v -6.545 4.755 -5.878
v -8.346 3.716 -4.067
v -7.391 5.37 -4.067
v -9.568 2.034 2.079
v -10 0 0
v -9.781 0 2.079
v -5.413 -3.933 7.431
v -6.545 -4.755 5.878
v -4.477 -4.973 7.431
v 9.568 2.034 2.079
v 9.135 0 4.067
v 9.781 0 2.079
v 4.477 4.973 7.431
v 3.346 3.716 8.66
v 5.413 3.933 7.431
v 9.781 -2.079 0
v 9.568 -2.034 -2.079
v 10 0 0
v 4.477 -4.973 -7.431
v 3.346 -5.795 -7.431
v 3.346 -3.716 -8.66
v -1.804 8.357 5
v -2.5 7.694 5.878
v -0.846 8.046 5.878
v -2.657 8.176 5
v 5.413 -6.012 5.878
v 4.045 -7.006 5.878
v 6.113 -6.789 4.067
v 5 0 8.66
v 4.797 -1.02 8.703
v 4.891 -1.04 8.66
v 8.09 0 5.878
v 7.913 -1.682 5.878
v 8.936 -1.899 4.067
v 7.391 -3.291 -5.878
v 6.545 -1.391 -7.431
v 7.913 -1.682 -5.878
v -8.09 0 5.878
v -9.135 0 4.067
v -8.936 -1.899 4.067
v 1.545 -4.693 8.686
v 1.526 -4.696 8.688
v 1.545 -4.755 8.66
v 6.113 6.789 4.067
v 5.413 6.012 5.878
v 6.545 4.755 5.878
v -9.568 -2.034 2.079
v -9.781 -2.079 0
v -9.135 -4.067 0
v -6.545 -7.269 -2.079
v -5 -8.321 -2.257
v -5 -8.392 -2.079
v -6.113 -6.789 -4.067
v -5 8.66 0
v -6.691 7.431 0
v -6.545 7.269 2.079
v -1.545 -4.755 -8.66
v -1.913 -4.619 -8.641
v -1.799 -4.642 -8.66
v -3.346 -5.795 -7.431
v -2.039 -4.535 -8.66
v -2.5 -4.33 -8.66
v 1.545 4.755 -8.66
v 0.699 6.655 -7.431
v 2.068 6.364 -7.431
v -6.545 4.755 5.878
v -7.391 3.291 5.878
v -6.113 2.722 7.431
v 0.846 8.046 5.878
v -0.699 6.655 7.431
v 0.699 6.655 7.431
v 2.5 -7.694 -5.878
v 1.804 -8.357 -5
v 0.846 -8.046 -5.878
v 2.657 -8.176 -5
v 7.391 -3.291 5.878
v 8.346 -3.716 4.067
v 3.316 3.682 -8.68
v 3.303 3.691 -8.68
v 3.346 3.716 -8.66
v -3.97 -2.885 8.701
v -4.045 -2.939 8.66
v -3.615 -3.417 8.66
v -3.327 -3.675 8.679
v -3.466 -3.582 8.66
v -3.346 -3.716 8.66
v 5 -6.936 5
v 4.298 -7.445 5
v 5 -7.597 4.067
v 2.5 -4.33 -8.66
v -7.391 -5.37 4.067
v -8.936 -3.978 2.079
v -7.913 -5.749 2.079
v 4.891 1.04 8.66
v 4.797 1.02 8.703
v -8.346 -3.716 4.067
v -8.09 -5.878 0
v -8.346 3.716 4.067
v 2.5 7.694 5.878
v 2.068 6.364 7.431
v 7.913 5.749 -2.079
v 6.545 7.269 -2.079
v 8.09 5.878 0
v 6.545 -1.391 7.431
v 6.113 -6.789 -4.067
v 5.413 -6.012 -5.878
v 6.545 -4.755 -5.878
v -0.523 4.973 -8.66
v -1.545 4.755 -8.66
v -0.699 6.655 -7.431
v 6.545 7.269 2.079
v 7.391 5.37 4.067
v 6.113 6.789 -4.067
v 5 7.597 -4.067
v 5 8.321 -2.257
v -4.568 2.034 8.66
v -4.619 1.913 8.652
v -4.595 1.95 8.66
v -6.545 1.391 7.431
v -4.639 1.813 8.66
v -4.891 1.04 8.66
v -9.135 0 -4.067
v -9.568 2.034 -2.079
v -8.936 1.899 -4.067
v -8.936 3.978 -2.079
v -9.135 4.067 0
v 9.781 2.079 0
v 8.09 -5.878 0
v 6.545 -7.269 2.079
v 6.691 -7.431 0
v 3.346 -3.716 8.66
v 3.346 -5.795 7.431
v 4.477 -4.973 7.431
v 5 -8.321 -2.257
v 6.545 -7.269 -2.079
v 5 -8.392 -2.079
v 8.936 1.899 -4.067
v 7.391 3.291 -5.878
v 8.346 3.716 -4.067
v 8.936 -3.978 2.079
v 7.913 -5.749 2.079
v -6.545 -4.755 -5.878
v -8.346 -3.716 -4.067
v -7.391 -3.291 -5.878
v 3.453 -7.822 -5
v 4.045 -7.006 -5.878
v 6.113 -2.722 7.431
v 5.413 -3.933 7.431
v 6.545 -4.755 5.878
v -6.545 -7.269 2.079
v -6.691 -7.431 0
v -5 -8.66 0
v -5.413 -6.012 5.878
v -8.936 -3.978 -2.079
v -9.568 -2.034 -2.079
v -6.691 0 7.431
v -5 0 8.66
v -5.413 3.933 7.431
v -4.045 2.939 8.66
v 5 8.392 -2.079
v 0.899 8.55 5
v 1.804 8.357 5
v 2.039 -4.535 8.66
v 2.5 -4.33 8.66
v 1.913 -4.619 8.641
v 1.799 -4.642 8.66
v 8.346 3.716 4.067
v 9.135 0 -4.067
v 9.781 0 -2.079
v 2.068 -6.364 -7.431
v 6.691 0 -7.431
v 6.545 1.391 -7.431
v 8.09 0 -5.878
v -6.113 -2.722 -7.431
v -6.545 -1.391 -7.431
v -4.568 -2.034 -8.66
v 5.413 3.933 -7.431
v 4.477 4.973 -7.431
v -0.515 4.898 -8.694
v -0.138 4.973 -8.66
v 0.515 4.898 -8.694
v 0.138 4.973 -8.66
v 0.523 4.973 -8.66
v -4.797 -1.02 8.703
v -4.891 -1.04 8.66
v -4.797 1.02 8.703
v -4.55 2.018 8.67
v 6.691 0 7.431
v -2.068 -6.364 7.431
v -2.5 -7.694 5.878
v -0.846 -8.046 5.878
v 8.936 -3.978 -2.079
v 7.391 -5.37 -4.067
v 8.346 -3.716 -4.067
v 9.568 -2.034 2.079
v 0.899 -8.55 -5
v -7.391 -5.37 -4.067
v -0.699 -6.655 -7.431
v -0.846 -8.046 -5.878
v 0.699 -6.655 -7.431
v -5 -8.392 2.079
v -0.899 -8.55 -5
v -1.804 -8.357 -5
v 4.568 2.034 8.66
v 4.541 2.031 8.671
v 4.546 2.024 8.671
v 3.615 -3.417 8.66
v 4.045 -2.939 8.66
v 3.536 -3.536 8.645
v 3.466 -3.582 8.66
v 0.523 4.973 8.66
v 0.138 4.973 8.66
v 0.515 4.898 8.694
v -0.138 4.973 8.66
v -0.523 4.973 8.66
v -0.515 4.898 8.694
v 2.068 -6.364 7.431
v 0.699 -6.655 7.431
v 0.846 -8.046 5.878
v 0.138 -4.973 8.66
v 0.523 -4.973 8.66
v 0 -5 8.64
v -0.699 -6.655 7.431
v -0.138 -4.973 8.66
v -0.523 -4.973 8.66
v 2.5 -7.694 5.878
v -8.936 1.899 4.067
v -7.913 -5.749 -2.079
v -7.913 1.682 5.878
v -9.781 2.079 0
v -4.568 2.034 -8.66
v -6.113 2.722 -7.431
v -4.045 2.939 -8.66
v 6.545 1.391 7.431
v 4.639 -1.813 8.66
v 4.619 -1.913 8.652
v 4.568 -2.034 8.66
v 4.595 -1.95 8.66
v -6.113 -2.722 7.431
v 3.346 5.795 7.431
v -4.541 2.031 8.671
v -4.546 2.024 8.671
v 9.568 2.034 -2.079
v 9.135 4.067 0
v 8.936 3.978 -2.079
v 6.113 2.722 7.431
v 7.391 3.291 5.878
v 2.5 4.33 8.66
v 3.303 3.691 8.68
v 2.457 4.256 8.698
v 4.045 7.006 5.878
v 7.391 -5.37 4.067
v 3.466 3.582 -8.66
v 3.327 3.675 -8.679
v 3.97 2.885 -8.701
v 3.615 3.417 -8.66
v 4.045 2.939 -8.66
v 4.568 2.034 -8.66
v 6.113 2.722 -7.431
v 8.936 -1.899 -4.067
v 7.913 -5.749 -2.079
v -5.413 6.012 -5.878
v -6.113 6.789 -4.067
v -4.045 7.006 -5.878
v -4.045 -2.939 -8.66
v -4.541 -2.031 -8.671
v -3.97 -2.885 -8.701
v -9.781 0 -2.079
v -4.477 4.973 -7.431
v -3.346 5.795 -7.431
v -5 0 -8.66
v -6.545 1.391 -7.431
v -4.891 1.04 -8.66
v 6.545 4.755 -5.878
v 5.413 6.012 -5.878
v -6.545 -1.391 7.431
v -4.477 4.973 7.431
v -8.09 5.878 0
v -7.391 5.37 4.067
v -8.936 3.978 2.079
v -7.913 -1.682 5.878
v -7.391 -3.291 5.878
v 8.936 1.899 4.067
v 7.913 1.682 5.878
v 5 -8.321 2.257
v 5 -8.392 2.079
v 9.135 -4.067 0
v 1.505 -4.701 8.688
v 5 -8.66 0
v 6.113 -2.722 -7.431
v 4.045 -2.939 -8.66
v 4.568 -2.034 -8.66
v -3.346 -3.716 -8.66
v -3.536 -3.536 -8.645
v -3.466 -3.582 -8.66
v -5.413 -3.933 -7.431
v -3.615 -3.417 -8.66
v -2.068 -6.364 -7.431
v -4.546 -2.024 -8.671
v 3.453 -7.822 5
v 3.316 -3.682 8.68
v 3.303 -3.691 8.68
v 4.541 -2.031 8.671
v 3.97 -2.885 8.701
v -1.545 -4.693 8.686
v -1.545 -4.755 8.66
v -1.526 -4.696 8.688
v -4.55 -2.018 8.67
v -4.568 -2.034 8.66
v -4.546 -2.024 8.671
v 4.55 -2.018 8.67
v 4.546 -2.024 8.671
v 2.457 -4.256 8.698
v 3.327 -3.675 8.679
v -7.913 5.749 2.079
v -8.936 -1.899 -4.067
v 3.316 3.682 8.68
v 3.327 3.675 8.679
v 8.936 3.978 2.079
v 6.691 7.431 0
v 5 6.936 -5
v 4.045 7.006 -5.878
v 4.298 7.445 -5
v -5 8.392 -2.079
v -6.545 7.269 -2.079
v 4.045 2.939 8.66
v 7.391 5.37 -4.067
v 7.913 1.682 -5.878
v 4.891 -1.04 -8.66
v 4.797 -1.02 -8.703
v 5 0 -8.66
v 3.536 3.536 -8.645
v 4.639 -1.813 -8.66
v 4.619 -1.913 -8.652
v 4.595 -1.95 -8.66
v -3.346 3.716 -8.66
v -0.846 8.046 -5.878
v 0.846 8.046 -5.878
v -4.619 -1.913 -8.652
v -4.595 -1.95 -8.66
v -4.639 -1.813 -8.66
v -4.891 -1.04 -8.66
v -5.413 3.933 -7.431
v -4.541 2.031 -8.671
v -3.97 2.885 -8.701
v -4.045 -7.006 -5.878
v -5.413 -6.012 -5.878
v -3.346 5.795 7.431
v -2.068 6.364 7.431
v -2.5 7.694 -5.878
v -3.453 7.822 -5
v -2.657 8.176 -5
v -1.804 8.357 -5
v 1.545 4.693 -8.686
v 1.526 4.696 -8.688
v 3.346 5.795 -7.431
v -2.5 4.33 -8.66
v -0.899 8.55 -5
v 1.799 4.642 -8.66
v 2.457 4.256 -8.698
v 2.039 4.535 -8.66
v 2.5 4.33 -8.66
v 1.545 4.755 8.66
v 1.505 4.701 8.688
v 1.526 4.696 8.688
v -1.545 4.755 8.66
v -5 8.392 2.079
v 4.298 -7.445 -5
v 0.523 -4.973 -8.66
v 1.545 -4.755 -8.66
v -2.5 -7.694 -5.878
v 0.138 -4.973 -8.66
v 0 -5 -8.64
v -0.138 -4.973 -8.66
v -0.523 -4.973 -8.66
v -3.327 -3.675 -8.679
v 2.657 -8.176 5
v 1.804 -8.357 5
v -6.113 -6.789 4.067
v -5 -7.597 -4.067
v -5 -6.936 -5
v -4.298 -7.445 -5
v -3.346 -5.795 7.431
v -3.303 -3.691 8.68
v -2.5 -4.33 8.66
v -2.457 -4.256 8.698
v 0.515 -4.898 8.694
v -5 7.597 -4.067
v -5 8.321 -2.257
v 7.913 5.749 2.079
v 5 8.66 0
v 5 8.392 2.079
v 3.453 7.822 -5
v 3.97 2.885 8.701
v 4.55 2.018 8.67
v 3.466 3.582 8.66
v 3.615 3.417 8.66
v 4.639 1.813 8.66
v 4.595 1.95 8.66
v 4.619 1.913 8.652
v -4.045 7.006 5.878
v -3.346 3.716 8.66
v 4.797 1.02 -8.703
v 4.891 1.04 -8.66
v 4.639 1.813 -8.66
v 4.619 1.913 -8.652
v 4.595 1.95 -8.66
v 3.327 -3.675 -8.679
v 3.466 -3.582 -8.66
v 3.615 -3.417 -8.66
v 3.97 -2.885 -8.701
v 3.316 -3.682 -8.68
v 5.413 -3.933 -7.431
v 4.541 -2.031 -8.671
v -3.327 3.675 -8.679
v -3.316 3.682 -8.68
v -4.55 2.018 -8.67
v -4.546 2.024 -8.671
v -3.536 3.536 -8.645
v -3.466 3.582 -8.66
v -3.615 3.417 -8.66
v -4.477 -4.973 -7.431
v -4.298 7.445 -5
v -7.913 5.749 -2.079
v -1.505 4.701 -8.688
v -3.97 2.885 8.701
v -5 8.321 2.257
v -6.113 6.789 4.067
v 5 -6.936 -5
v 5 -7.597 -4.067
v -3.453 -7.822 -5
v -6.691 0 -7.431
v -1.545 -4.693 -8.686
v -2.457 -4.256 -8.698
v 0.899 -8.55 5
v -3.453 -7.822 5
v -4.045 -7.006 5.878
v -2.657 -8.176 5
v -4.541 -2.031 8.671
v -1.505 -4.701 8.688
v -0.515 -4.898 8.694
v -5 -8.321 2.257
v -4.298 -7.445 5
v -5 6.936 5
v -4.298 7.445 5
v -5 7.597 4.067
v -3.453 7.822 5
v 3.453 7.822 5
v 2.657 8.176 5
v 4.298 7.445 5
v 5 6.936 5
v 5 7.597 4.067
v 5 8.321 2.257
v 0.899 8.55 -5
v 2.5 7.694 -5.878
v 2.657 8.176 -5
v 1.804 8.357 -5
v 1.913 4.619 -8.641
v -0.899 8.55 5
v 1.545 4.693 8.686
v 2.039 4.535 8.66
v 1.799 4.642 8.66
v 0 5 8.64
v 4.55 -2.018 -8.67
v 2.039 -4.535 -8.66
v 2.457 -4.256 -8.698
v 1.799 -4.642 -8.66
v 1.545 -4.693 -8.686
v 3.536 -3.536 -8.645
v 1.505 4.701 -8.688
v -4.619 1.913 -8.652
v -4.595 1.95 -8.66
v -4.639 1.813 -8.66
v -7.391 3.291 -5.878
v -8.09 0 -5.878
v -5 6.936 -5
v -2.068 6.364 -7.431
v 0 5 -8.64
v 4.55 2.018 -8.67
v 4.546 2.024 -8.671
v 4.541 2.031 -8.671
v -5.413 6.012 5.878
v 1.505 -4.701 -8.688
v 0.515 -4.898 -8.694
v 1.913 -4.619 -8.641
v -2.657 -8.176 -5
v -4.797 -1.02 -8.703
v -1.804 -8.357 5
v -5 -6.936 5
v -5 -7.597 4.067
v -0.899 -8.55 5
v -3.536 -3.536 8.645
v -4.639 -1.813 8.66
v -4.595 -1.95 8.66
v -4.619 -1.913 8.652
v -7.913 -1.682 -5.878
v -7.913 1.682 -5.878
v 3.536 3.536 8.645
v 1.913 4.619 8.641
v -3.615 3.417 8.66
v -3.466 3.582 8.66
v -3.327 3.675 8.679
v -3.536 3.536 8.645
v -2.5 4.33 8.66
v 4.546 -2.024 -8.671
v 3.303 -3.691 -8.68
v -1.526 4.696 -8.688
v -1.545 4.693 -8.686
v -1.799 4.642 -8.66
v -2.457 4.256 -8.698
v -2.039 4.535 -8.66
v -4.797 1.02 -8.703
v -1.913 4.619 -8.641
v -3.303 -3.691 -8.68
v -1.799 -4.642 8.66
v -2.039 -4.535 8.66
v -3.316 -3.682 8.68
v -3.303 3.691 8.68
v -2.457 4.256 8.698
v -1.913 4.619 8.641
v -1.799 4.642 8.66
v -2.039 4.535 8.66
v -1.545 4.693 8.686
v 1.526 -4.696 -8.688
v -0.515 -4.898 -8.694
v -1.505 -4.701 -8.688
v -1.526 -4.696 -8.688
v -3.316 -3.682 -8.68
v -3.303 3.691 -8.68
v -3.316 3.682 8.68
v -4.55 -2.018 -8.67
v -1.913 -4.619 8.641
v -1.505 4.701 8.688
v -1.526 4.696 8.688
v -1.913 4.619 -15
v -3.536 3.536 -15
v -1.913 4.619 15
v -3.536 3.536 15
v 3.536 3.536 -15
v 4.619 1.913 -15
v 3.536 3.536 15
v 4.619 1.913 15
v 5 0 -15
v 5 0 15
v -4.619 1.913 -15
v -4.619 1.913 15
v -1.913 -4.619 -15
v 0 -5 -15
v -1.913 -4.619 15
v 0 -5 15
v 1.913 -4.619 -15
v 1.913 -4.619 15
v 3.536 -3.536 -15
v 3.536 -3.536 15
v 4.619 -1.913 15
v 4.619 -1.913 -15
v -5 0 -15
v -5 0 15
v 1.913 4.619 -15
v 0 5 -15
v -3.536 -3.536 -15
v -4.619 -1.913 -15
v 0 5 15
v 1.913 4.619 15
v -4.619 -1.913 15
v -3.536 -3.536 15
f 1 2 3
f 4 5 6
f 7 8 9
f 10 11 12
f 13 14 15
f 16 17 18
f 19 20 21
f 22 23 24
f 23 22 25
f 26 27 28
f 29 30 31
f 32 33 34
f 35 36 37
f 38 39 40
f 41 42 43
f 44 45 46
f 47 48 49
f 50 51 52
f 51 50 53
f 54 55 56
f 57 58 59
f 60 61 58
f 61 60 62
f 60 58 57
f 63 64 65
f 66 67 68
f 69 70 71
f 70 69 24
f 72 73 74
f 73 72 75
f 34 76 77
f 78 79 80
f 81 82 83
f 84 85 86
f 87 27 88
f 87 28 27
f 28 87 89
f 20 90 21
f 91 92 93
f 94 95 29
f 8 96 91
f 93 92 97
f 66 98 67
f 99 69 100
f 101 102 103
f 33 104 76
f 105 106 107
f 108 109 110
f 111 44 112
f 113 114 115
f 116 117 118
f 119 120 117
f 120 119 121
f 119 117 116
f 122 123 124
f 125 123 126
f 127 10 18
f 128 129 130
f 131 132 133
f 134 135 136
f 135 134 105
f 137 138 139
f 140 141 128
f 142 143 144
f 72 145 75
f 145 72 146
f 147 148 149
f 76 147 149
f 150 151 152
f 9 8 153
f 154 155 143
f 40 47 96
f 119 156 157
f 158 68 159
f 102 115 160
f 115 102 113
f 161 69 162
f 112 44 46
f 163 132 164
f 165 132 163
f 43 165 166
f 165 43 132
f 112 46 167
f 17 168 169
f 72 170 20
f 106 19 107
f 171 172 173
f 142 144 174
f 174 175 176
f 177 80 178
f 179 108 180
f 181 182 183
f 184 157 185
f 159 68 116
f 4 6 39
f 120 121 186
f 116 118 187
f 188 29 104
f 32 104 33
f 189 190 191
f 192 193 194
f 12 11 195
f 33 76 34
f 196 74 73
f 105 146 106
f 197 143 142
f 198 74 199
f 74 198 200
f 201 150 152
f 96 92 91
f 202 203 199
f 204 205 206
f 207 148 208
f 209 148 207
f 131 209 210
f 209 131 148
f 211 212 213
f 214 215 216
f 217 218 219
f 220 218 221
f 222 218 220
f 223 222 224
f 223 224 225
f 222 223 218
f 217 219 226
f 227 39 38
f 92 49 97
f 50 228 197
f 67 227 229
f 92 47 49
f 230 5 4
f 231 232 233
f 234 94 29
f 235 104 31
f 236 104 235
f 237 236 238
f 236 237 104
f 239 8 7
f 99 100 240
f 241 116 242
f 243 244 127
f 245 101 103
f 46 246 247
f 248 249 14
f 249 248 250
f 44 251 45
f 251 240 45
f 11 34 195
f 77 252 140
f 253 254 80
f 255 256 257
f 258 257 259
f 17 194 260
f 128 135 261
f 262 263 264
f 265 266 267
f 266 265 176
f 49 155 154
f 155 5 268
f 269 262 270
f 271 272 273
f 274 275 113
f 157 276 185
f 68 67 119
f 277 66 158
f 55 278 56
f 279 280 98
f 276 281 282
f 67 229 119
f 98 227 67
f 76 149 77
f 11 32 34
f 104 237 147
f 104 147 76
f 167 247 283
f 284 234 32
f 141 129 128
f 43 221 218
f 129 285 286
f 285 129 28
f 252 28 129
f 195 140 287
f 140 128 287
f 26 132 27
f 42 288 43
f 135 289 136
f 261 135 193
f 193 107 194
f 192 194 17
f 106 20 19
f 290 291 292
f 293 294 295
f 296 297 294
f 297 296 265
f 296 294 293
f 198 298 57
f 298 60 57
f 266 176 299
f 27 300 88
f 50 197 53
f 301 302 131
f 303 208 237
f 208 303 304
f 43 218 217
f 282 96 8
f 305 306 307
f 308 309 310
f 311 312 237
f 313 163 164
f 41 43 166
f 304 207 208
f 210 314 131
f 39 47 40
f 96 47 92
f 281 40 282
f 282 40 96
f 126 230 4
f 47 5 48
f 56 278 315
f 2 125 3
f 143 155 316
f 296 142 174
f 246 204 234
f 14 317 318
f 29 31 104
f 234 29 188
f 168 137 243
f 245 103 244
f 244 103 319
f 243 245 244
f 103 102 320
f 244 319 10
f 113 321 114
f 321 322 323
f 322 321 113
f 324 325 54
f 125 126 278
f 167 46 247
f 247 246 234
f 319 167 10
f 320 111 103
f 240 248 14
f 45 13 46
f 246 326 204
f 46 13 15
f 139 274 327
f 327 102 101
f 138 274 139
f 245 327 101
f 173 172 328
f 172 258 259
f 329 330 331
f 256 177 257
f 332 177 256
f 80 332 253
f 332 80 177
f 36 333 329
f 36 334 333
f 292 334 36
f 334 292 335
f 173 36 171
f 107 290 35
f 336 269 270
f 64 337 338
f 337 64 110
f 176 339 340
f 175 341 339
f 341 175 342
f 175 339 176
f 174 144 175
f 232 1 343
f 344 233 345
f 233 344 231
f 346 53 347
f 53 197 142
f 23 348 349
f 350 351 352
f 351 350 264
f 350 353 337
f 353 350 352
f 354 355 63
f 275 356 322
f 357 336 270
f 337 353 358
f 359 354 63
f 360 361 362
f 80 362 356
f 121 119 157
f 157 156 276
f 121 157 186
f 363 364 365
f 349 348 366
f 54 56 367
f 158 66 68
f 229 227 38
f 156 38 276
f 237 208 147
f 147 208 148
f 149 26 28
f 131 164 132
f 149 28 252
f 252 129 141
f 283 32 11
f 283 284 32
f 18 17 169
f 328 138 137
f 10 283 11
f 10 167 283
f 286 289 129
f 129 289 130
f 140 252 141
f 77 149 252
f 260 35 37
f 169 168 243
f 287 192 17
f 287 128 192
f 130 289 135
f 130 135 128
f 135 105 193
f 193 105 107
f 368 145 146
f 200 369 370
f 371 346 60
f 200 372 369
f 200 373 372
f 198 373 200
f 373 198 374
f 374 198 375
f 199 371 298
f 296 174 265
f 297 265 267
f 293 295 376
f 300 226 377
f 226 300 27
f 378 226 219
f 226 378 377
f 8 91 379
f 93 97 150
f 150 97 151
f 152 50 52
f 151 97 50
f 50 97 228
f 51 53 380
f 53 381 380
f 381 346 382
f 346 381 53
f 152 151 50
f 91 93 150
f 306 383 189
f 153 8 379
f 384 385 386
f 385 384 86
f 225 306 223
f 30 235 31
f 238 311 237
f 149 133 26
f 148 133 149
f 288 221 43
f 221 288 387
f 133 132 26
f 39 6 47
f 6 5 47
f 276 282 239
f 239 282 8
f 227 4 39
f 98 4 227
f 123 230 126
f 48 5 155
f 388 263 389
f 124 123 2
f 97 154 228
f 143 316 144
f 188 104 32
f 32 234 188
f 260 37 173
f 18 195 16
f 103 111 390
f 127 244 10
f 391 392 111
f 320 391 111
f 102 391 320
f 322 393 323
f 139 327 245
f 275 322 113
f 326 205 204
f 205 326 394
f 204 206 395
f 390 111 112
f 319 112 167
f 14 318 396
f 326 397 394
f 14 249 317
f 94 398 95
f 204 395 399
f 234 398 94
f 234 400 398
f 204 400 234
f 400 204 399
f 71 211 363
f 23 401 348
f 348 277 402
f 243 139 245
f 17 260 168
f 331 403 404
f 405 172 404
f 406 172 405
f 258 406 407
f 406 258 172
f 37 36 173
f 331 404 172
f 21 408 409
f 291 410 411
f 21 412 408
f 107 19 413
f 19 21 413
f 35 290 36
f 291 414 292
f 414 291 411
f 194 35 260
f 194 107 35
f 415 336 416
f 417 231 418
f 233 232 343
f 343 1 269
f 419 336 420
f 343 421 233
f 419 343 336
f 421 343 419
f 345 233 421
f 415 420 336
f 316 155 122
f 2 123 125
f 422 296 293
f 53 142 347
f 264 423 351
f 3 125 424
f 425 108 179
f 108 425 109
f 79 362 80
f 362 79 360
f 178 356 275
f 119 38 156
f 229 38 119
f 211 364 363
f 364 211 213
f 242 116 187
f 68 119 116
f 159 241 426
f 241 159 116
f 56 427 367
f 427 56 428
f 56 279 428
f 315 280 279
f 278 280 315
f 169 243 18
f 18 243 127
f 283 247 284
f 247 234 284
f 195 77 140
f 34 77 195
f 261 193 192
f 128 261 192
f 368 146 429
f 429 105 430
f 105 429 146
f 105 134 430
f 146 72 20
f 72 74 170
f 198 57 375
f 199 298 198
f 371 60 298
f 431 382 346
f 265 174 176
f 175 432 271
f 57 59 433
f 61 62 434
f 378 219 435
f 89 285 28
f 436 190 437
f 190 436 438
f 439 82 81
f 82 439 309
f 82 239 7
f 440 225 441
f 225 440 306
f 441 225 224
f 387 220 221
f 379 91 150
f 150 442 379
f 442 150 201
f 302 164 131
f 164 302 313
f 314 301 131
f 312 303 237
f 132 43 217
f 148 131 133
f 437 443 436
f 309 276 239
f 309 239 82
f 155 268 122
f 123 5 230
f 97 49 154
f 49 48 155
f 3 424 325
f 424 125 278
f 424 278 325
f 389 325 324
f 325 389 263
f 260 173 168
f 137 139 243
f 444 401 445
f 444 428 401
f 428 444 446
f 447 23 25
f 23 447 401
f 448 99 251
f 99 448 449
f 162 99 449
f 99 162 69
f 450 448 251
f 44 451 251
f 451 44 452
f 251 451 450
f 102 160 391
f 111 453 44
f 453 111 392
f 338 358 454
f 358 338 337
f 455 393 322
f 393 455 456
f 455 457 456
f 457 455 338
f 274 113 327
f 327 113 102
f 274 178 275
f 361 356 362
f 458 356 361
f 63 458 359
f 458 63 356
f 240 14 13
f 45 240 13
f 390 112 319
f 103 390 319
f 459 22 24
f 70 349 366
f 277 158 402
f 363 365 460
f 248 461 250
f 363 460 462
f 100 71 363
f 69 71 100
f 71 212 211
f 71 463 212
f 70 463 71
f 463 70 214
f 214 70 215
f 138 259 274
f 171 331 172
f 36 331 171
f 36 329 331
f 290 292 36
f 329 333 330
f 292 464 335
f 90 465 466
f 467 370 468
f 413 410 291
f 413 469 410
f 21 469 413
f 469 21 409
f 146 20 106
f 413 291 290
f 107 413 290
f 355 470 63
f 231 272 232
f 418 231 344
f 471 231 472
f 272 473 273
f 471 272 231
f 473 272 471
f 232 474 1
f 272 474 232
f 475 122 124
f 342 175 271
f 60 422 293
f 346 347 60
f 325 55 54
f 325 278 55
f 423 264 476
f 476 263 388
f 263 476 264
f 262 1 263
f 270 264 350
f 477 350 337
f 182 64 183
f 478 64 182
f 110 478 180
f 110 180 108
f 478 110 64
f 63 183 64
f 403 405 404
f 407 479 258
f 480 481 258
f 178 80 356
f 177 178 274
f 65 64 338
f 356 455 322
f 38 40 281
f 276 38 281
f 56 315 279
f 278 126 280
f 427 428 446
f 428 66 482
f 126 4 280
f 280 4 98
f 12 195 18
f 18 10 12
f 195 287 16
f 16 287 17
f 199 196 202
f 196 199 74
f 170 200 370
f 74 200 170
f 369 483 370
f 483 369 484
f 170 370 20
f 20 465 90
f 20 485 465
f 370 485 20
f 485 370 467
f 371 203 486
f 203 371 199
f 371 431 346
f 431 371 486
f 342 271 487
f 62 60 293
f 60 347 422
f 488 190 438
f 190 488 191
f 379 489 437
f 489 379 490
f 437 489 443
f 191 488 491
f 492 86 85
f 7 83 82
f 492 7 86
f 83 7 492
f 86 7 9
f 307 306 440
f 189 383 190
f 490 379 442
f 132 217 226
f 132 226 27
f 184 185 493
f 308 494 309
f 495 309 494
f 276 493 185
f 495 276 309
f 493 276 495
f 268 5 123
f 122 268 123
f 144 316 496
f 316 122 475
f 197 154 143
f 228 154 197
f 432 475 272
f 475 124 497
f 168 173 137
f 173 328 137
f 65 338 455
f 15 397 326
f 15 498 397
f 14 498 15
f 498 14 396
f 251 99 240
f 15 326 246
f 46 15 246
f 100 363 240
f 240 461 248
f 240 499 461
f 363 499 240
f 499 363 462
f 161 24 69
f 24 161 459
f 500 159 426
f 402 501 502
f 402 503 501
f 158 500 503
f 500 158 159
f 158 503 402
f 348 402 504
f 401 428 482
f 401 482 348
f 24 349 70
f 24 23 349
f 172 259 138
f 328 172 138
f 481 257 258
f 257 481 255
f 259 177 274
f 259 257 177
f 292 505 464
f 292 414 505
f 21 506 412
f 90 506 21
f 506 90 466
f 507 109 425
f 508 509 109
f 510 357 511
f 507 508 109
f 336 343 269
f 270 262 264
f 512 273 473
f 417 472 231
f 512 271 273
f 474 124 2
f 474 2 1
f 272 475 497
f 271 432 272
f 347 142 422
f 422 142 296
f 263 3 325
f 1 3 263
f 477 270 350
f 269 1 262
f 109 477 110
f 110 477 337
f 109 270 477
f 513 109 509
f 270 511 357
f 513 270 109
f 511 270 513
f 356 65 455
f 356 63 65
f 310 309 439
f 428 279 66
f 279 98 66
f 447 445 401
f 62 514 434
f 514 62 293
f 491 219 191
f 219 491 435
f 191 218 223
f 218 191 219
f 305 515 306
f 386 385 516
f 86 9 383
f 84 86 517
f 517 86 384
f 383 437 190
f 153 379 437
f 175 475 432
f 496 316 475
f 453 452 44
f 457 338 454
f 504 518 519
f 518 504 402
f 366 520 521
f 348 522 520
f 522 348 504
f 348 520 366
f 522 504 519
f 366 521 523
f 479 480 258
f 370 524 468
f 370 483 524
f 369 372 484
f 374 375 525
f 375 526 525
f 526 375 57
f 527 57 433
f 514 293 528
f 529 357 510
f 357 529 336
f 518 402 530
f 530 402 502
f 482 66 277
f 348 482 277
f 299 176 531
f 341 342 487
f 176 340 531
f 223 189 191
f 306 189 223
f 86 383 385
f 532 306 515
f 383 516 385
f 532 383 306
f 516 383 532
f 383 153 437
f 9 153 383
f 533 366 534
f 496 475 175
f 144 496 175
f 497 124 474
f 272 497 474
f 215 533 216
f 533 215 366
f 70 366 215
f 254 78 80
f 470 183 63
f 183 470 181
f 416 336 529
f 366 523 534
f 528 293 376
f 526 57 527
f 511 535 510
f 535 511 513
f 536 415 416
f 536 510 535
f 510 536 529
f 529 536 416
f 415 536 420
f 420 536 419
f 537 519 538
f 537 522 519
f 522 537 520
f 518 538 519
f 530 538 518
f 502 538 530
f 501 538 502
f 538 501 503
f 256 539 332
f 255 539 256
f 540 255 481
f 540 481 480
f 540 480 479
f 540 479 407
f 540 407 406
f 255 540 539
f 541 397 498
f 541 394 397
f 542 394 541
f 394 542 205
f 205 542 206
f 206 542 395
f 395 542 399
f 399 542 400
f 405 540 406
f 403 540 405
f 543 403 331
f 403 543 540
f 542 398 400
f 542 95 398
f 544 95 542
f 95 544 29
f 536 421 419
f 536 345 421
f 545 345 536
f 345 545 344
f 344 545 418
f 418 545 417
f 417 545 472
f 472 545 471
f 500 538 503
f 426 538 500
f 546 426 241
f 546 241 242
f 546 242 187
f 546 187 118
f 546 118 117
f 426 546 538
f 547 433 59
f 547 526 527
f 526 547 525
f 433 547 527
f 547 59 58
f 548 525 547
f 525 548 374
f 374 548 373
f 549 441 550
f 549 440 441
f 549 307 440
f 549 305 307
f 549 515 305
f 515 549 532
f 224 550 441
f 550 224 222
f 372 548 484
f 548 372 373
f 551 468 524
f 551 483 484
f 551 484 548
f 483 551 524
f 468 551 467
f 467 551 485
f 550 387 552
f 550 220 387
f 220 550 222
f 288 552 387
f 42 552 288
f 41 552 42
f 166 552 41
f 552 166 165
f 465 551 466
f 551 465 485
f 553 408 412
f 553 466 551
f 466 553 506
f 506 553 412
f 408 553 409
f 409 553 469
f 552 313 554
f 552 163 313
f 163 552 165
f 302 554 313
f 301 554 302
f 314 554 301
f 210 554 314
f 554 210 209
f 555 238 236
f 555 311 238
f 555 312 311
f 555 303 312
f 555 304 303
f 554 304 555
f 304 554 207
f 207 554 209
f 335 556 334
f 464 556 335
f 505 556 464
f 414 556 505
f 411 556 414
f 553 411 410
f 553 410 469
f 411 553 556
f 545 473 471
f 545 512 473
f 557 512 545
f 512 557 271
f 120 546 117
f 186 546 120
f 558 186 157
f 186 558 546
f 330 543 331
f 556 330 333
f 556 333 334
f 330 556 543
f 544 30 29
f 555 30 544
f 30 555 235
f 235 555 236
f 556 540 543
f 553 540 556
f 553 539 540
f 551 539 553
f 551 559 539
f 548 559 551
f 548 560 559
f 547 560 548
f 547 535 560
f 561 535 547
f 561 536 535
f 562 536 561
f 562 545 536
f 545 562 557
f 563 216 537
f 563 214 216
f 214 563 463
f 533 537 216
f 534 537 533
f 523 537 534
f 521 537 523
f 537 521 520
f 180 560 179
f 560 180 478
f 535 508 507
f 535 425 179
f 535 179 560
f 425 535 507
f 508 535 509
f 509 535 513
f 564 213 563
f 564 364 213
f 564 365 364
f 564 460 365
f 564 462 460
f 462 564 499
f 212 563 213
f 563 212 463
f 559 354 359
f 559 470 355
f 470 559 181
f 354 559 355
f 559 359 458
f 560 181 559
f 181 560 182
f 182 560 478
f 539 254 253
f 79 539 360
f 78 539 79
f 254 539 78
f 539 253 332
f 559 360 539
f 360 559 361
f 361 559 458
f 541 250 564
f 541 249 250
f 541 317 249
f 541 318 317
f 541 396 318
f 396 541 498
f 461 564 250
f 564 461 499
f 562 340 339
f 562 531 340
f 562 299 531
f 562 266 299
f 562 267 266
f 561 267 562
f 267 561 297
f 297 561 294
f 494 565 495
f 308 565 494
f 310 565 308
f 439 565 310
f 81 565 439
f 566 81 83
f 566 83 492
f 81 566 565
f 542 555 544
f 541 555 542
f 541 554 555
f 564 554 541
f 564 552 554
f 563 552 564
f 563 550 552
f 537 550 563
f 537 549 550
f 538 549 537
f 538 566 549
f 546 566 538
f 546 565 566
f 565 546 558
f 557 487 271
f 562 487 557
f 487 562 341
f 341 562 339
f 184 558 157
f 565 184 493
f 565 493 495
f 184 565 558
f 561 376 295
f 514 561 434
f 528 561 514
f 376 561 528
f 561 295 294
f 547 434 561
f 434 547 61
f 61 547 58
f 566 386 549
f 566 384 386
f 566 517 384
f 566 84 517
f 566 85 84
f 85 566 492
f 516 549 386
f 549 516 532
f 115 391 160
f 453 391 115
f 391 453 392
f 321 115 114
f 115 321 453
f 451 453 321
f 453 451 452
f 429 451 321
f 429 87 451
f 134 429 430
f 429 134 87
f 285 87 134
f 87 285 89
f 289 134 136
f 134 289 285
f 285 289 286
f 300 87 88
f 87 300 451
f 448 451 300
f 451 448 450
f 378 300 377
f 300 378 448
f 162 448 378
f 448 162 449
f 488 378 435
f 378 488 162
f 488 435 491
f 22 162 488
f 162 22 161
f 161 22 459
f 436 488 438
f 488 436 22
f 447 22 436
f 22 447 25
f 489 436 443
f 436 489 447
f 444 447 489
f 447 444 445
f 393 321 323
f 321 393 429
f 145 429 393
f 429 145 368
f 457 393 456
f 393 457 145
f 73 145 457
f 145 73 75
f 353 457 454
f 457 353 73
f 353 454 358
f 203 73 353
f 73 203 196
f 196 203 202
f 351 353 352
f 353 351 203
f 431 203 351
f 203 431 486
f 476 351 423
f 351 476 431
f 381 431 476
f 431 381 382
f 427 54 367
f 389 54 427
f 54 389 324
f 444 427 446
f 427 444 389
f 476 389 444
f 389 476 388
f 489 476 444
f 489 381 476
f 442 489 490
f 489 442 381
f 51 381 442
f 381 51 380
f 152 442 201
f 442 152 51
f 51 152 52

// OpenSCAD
difference() {
  union() {
      sphere(10);
      cylinder(h=30, r=5, center=true); 
  }
  cube([10, 30, 10], center=true); 
}
%color([0.5,0.5,1], alpha=0.3) cube([10,30,10], center=true); 
